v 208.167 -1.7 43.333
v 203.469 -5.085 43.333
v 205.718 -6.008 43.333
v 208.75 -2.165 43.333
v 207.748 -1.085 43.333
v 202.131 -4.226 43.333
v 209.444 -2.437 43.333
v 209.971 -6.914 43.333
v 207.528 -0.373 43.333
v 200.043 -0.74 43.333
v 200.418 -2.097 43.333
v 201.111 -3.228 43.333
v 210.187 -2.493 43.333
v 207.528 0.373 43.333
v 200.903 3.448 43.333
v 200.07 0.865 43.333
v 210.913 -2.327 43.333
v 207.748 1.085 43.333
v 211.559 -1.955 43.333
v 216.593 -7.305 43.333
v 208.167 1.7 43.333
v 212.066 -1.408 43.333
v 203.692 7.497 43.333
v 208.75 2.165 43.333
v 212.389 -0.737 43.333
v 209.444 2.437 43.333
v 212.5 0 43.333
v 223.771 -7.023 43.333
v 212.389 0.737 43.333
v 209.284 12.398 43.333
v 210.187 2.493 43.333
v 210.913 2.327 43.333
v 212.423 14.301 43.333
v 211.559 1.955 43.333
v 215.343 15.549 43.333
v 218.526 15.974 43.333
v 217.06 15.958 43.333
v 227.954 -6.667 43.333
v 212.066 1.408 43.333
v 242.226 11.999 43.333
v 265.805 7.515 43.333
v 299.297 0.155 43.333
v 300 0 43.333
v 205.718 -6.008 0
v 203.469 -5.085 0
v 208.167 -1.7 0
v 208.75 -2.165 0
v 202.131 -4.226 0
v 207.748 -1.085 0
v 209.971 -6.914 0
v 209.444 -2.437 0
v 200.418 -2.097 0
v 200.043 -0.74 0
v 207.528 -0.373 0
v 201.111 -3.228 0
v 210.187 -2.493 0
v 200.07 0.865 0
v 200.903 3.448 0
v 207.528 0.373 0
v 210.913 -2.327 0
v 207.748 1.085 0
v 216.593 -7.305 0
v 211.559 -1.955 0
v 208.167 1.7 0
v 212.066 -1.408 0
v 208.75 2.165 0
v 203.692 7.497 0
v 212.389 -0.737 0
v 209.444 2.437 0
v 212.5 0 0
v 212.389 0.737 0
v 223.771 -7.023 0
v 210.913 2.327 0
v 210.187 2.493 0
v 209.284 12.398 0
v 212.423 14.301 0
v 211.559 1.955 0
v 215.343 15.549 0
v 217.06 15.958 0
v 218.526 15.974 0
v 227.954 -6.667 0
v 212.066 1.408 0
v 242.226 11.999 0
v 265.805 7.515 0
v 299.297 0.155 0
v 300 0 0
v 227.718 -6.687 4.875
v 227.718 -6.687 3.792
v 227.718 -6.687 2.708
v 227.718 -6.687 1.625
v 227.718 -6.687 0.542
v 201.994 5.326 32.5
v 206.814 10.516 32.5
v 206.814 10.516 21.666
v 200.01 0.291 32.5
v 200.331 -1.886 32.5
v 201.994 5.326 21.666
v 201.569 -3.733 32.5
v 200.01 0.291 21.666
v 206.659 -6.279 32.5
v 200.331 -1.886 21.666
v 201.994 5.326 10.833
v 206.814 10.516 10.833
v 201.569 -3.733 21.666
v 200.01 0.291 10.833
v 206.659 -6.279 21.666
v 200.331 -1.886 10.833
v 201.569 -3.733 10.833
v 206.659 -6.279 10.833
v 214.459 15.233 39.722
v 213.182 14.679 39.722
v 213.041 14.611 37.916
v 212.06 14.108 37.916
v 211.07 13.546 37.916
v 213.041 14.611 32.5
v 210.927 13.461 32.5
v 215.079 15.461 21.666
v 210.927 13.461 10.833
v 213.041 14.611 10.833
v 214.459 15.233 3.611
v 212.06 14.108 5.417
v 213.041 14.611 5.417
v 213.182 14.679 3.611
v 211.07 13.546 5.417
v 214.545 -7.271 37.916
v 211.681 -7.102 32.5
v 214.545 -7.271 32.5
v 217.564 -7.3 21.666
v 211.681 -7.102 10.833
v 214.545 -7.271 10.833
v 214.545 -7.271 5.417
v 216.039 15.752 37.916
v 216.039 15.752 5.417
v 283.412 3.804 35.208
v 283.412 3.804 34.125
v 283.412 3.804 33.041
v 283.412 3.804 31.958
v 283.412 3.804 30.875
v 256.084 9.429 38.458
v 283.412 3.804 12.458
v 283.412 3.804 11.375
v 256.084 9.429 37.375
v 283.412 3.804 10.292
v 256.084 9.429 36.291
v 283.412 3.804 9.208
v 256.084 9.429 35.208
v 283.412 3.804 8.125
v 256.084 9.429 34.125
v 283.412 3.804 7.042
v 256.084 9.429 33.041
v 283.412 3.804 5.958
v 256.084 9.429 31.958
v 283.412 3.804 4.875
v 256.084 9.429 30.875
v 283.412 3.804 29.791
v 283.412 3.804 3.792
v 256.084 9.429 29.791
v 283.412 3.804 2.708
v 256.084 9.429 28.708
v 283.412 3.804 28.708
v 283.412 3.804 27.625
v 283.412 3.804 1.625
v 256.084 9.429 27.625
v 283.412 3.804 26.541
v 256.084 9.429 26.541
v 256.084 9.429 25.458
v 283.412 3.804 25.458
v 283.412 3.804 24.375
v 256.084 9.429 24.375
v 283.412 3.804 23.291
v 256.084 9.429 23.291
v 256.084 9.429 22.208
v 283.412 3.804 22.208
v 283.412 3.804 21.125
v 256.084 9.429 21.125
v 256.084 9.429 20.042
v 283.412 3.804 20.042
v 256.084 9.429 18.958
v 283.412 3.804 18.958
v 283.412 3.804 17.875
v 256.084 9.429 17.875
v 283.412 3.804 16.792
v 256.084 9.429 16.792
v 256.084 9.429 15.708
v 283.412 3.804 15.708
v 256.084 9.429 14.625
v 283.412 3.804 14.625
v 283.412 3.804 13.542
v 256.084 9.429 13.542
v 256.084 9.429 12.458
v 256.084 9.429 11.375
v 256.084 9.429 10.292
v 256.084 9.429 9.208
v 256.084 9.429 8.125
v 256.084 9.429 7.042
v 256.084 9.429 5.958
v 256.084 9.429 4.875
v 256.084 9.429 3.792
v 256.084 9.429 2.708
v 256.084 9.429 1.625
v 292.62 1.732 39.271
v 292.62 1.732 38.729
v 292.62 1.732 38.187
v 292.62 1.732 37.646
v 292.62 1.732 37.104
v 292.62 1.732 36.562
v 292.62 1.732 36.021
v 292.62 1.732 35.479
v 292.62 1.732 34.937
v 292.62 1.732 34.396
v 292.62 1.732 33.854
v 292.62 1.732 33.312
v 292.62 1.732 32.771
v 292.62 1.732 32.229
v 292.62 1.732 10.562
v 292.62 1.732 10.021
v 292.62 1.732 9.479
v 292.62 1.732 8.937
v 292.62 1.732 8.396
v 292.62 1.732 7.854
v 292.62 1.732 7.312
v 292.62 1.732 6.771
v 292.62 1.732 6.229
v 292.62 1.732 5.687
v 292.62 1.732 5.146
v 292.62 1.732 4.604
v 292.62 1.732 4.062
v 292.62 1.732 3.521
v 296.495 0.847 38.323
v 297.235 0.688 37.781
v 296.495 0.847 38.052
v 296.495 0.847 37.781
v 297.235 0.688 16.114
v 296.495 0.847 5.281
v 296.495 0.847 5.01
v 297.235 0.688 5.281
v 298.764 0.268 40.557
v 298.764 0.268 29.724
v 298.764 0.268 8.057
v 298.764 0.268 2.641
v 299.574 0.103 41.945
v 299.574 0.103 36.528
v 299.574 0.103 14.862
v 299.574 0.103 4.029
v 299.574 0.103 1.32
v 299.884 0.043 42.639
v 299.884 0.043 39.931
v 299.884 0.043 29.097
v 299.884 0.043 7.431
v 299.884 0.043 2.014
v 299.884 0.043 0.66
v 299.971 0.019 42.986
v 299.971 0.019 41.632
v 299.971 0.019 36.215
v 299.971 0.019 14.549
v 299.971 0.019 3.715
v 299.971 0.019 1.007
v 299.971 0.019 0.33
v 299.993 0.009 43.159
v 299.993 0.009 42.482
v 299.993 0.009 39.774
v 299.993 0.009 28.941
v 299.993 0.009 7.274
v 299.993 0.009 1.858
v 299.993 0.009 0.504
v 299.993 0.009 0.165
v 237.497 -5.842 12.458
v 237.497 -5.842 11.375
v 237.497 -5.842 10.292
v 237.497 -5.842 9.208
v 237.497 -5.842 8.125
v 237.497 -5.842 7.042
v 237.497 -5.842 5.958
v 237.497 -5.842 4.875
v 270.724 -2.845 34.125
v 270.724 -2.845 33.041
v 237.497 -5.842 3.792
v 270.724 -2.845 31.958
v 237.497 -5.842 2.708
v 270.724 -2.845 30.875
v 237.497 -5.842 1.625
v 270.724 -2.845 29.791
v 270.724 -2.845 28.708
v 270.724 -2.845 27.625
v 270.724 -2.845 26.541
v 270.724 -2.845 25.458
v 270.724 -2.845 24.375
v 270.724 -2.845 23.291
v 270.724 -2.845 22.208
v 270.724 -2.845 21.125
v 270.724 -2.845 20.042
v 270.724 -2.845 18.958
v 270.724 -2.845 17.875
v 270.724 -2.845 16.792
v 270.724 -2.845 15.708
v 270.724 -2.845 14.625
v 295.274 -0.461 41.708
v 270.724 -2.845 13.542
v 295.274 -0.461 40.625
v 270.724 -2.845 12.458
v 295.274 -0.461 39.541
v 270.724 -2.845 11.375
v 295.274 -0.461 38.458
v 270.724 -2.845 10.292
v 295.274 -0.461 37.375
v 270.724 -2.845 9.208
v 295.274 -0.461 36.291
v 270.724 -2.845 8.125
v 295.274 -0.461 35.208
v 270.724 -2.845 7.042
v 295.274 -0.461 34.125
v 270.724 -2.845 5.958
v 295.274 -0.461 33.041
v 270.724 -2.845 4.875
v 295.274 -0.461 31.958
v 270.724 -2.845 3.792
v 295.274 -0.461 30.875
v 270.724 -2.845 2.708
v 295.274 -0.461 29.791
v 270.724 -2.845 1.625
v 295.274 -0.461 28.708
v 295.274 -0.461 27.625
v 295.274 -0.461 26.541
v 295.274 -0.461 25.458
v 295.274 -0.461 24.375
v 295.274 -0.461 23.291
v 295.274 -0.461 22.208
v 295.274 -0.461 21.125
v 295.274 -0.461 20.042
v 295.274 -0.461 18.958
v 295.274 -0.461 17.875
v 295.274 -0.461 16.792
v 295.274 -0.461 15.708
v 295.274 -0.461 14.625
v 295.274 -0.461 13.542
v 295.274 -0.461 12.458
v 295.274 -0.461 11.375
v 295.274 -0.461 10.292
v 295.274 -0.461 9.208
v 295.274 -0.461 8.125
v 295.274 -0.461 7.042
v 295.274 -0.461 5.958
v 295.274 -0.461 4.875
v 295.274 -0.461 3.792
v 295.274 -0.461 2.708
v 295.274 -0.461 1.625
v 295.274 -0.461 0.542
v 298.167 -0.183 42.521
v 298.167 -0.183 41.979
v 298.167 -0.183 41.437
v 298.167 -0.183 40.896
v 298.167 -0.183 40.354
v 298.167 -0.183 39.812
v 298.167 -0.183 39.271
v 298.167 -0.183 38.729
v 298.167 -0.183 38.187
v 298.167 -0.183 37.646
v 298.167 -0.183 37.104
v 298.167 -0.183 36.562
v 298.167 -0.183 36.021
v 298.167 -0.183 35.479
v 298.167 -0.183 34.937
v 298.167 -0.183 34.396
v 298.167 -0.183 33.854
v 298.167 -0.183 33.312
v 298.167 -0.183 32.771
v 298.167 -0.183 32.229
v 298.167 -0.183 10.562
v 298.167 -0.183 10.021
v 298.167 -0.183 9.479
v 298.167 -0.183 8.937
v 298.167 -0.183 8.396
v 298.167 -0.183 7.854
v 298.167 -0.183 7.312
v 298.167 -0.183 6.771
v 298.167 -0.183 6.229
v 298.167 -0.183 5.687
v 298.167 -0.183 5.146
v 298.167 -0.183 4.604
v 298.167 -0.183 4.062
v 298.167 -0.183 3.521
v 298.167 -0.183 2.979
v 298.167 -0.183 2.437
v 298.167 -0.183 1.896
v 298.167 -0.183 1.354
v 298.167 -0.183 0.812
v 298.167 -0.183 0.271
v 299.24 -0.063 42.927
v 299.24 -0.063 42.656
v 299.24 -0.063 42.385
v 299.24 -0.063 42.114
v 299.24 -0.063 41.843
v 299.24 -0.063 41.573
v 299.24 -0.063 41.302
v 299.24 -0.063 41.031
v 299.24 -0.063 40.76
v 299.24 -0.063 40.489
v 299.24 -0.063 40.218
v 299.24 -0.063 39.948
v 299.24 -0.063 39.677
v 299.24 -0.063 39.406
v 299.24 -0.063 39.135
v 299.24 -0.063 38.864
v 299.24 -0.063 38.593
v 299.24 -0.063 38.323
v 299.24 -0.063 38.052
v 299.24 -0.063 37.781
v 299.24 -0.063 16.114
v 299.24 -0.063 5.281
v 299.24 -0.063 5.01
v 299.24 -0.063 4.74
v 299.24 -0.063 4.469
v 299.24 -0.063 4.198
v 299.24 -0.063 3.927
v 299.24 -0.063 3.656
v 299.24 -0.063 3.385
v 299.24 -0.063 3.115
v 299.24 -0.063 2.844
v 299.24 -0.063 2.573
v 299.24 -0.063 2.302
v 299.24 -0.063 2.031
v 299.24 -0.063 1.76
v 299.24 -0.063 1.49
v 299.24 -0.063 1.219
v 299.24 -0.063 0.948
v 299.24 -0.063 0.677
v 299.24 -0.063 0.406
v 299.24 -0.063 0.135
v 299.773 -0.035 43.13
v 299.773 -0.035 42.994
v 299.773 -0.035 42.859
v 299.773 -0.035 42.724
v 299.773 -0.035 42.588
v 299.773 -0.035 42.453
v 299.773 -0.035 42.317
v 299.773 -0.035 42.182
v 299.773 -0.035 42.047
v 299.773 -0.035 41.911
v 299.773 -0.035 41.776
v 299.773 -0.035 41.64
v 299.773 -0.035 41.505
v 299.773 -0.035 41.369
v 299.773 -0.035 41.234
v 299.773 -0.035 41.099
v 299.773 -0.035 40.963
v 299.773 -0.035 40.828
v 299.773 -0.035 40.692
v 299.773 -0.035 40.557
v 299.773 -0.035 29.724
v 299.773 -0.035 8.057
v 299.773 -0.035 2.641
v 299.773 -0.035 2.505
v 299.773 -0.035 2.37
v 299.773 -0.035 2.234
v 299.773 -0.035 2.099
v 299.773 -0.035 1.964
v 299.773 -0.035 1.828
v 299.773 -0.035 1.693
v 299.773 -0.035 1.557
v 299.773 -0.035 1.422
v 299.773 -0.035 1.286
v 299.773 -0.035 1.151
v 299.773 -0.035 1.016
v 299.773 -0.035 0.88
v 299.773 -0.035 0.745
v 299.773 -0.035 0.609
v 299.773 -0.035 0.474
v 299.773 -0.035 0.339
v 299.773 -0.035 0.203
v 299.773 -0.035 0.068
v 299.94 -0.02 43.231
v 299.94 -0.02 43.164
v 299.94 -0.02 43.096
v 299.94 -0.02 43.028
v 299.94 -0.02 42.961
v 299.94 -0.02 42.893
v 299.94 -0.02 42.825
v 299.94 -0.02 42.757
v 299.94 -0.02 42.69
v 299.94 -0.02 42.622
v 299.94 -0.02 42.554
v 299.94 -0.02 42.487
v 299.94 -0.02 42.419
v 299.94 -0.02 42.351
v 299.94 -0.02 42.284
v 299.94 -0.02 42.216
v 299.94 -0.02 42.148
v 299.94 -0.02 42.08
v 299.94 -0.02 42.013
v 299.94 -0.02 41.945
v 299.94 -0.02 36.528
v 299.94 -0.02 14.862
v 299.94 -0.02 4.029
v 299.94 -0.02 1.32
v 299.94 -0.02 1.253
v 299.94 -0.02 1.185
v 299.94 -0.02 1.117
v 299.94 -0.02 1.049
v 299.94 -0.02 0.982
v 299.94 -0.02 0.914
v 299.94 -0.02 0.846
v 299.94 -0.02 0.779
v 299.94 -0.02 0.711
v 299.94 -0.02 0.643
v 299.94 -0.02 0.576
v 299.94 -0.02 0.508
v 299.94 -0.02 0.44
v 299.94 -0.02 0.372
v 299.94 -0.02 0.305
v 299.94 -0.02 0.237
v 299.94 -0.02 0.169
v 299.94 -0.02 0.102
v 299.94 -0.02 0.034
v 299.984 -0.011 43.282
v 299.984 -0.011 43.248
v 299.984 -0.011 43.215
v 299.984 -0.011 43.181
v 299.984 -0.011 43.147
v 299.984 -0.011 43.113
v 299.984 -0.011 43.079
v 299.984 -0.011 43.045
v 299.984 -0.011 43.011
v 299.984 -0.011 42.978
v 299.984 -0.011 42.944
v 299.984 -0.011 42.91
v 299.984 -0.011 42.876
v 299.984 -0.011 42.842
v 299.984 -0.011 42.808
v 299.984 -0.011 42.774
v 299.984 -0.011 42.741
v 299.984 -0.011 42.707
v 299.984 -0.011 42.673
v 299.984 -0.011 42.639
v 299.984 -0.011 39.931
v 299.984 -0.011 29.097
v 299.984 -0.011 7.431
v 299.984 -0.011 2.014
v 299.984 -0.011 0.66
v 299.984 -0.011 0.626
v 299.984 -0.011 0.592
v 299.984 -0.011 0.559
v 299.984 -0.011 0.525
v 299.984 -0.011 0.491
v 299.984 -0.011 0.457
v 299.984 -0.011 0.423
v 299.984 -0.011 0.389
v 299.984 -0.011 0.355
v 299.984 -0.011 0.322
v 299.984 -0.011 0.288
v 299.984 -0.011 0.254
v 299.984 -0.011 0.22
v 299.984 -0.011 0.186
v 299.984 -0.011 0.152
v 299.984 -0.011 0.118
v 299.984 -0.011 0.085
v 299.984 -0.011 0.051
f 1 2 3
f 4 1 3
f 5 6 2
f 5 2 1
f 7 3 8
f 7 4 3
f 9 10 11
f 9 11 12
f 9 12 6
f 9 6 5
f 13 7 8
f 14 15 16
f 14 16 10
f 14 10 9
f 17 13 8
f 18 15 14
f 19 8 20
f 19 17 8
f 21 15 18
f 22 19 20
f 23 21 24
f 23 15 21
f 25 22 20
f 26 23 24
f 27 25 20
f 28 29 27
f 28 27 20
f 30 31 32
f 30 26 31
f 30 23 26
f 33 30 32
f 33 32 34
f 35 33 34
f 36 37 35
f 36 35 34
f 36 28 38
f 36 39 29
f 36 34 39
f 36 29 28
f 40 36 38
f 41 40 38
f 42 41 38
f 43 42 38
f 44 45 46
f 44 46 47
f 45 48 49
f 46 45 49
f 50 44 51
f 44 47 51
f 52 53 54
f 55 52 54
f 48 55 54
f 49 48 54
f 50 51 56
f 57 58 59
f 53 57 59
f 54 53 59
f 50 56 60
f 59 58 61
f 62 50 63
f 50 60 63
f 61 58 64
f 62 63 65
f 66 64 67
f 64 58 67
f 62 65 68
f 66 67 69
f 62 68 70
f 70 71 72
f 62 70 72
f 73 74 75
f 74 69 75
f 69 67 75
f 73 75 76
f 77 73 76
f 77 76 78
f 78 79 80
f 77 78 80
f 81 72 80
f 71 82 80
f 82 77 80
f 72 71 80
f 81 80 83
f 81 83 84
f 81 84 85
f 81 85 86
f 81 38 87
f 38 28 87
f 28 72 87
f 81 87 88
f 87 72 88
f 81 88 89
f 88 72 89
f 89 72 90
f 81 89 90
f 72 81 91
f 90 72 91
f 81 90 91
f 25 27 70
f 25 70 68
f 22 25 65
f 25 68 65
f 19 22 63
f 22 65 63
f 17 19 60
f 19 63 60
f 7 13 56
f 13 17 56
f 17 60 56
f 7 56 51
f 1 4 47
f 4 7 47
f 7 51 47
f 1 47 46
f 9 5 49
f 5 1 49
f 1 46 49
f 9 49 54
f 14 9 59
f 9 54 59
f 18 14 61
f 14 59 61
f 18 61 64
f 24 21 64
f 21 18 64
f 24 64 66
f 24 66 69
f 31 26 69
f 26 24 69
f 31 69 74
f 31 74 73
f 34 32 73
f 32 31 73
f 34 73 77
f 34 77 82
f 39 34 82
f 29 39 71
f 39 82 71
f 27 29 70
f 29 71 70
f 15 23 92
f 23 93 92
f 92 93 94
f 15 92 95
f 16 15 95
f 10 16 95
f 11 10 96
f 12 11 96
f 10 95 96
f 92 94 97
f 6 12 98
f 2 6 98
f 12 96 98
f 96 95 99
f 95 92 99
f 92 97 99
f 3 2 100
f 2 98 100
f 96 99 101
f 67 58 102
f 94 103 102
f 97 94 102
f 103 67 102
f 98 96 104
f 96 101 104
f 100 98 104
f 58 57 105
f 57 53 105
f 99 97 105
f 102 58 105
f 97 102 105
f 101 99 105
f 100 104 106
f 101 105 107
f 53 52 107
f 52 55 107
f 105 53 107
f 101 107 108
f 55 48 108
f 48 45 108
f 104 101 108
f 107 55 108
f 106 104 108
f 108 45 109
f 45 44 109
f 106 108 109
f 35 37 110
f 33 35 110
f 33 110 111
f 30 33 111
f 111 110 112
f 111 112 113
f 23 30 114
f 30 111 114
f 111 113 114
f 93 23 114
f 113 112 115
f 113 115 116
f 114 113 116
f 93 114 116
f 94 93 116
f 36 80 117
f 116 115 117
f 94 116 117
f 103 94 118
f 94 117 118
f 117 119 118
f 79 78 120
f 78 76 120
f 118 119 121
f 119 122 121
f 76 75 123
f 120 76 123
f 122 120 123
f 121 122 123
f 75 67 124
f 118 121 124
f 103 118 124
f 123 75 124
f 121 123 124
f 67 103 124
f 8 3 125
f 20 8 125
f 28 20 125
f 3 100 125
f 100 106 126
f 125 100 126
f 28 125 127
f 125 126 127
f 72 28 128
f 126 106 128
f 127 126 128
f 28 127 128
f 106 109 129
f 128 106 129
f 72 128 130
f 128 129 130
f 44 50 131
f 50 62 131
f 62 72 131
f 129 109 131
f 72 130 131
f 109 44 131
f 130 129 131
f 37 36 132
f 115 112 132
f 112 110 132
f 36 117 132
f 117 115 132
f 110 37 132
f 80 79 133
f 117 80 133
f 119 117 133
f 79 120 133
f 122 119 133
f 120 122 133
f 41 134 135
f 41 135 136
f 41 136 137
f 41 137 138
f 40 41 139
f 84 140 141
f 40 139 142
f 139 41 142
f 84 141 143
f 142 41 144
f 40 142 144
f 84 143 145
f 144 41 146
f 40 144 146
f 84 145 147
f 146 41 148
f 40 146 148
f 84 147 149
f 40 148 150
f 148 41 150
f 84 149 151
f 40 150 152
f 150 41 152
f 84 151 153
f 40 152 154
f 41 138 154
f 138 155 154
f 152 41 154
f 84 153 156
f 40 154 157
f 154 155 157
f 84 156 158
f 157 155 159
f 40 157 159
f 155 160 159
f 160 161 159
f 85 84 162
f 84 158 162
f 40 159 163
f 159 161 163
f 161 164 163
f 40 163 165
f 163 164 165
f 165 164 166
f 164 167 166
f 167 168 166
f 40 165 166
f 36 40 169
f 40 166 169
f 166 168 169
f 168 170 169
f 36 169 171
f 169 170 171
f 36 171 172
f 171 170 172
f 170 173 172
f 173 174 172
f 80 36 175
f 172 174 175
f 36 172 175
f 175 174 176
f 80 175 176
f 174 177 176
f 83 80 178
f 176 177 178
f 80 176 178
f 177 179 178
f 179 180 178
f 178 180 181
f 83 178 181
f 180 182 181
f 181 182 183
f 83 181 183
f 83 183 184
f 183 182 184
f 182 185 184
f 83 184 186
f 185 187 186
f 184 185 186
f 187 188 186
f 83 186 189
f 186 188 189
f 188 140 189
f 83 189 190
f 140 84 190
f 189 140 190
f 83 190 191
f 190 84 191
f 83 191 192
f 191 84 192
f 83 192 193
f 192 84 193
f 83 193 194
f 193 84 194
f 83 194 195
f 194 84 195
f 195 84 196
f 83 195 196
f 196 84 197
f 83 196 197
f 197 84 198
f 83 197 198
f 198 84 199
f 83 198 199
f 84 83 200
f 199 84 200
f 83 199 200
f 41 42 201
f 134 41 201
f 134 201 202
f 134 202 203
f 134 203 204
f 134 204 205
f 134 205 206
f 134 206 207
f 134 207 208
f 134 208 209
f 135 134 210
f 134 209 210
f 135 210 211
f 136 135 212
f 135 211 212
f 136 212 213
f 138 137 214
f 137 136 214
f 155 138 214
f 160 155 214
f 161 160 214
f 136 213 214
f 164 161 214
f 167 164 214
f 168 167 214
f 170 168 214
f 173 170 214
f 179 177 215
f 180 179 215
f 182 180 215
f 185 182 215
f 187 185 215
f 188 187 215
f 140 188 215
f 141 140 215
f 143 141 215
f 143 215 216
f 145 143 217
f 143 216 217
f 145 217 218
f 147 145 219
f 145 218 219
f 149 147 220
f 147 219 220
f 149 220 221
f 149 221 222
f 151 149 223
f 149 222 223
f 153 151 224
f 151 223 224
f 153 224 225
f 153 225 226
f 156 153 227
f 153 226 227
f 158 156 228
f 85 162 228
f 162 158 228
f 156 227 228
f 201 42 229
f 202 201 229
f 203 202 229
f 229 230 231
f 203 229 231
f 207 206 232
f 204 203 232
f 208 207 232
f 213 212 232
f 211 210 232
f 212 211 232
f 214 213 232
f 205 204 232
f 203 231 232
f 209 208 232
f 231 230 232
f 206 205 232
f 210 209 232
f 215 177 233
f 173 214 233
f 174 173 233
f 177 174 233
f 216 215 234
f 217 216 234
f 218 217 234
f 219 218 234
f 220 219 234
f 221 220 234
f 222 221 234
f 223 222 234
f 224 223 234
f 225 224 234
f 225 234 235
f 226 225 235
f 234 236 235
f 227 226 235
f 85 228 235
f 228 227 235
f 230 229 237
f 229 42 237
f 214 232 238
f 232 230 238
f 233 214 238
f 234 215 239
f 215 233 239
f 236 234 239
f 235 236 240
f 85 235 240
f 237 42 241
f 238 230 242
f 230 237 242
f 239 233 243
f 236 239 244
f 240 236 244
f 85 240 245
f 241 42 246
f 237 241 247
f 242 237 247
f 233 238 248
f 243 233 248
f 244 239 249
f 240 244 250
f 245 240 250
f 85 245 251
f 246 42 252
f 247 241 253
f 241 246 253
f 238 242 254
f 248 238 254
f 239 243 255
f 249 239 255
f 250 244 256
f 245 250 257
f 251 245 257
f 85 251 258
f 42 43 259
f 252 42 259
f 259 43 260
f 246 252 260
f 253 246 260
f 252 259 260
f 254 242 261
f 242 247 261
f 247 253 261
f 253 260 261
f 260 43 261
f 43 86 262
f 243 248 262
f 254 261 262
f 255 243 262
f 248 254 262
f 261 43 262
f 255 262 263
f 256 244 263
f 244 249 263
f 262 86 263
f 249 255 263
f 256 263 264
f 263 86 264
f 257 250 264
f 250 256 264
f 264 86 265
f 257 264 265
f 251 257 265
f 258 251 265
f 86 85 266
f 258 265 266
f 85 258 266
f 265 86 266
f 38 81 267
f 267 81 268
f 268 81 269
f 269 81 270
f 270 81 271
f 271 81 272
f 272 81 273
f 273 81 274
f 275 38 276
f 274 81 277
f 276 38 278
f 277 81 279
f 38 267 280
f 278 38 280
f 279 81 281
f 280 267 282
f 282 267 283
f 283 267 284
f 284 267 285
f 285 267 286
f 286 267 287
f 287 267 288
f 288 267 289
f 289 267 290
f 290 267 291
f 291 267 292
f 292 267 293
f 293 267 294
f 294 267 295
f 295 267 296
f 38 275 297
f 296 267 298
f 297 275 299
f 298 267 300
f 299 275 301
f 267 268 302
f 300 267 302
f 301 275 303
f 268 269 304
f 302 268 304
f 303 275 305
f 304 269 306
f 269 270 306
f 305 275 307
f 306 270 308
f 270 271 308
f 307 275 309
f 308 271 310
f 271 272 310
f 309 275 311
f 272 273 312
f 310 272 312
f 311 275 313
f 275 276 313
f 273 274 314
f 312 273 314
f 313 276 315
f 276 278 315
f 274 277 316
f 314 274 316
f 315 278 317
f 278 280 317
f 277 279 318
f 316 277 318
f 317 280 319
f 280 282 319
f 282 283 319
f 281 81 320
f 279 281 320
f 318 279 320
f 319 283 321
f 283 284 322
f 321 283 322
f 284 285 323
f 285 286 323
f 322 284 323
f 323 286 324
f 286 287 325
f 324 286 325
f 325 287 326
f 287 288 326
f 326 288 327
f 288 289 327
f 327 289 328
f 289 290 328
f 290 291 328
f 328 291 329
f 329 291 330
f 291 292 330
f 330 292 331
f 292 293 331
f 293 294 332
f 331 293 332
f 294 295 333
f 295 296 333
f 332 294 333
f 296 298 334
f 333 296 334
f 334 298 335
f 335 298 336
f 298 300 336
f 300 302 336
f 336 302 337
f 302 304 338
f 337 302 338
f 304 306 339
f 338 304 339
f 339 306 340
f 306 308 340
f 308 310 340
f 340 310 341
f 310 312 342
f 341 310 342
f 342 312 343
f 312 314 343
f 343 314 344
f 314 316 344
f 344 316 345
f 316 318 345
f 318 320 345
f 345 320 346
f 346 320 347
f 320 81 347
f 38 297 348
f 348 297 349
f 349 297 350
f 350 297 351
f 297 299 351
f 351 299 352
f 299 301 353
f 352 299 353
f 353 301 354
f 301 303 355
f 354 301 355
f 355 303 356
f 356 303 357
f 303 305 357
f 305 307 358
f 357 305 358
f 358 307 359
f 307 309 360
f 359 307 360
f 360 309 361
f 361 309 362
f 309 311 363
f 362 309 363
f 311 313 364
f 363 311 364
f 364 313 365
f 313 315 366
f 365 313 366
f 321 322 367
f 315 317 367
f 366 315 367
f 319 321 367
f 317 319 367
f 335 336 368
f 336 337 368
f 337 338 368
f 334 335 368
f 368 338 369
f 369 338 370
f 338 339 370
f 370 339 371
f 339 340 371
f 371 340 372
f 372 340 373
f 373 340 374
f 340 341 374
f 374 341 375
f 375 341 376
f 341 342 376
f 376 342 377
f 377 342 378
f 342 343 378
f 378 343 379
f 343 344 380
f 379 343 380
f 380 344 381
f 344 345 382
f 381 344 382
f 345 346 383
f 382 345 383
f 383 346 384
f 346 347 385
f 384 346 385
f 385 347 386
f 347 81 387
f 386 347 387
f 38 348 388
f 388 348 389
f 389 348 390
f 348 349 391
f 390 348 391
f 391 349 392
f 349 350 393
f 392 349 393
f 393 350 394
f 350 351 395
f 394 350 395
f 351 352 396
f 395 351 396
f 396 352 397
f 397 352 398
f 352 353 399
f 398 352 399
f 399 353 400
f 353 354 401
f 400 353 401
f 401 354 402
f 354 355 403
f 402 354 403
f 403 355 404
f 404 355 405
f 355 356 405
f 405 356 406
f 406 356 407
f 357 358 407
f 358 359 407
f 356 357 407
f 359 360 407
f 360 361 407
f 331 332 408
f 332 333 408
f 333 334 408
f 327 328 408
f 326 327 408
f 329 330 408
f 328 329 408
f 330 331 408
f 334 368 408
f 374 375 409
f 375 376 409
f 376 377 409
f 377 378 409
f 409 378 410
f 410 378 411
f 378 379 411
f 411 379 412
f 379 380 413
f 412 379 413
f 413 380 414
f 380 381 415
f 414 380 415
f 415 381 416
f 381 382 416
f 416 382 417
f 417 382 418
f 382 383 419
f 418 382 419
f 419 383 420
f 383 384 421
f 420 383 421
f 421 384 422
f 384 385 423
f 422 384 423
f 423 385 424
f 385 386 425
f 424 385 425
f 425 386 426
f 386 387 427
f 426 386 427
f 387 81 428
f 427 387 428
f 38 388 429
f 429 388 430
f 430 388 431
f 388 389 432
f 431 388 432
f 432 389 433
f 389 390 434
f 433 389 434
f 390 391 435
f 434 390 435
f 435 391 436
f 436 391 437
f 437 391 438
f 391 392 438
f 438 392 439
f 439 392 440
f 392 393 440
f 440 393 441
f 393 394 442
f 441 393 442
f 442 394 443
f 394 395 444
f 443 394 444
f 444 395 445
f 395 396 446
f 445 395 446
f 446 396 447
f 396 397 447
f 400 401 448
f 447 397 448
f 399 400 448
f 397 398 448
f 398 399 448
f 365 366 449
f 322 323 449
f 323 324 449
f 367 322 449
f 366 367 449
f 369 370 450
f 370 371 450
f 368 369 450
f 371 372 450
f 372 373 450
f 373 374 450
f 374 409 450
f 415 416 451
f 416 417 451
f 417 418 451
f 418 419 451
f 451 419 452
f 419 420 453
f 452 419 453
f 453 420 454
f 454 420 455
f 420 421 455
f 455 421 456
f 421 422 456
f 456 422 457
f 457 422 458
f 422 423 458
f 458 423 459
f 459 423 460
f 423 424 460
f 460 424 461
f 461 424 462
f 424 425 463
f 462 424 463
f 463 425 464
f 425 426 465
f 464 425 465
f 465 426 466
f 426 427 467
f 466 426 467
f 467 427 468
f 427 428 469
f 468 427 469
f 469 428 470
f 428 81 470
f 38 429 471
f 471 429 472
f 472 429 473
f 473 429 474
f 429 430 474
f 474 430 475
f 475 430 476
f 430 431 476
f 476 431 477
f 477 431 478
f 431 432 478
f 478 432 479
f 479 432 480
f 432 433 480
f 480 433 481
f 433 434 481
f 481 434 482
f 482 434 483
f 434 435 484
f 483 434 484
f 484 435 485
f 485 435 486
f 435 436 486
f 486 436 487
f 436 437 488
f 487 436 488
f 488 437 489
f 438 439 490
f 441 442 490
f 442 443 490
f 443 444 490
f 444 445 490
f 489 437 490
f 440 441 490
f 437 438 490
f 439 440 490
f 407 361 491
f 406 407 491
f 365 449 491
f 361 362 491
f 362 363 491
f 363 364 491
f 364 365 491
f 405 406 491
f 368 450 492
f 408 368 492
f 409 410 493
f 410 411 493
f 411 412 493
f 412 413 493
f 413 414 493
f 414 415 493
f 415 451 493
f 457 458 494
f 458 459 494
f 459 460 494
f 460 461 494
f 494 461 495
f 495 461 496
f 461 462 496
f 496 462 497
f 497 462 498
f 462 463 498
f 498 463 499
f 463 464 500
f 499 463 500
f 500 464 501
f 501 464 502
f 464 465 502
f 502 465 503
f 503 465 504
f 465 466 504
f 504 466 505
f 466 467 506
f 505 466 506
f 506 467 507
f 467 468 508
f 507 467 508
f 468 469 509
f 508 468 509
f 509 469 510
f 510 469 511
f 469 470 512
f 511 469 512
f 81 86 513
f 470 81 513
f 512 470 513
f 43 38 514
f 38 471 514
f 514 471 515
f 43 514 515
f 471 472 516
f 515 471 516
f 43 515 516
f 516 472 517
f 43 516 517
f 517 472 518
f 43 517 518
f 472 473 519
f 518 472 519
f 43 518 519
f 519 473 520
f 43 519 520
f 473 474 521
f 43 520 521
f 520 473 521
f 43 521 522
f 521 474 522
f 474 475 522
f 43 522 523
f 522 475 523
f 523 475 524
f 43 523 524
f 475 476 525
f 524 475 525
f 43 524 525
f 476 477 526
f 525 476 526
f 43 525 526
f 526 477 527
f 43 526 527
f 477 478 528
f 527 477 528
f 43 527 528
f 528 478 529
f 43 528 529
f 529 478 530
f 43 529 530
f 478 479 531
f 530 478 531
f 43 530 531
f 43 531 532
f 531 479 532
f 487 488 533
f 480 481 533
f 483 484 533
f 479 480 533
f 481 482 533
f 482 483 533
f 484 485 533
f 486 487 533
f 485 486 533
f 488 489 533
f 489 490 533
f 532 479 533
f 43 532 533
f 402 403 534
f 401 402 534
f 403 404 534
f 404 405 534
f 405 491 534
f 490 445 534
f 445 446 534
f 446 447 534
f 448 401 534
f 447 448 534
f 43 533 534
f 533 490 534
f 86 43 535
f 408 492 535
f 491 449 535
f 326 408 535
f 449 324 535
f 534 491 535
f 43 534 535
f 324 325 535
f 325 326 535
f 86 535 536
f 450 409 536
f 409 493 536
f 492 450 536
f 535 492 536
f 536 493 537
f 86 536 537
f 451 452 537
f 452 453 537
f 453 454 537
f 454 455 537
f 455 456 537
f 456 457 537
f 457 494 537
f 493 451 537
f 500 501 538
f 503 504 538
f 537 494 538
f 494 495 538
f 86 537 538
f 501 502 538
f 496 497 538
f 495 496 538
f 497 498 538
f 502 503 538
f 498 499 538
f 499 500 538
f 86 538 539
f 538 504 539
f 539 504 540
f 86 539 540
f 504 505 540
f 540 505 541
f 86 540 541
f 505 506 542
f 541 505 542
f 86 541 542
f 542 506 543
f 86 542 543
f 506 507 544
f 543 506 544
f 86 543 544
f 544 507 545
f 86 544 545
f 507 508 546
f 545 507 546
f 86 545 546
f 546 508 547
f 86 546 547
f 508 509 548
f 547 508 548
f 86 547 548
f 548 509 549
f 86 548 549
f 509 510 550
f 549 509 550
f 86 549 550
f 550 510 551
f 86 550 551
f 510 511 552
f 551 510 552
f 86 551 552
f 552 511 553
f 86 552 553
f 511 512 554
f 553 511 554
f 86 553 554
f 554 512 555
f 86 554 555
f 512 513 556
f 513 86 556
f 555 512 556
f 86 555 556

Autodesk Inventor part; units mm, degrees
ref_plane "YZ Plane" through (0, 0, 0) normal (1, 0, 0) x (0, 1, 0)
ref_plane "XZ Plane" through (0, 0, 0) normal (0, 1, 0) x (-1, 0, 0)
ref_plane "XY Plane" through (0, 0, 0) normal (0, 0, 1) x (1, 0, 0)
sketch "Sketch1" plane through (0, 0, 0) normal (0, 0, 1) x (1, 0, 0)
  spline S0 degree 5 poles (300, 0) (300.0016, 0.0244) (299.7036, 0.09) (298.2843, 0.2856) (298.1861, 0.6201) (294.2411, 1.1852) (292.5088, 1.8941) (287.5168, 2.8048) (283.3251, 3.8823) (277.2635, 5.114) (271.0288, 6.4738) (263.7046, 7.9415) (255.8588, 9.4927) (247.2609, 11.1039) (238.105, 12.7506) (228.3746, 14.4096) (218.1643, 16.0564) (207.5185, 17.6669) (196.5111, 19.219) (185.2054, 20.6879) (173.6732, 22.052) (161.9834, 23.2887) (150.21, 24.3752) (138.4162, 25.2964) (126.6928, 26.0196) (115.0744, 26.5602) (103.5988, 26.7997) (92.4288, 26.7578) (81.6023, 26.4231) (71.2108, 25.8005) (61.3178, 24.8978) (51.9933, 23.7307) (43.2967, 22.3175) (35.2844, 20.6817) (28.0043, 18.8519) (21.5007, 16.8582) (15.8056, 14.7303) (10.9426, 12.4987) (6.9231, 10.1816) (3.745, 7.791) (1.4298, 5.3026) (0.027, 2.7048) (-0.2762, -0.026) (0.5609, -2.6395) (2.4314, -4.909) (5.1526, -6.9052) (8.674, -8.6574) (12.9744, -10.2099) (18.0511, -11.5643) (23.8856, -12.7277) (30.4535, -13.6933) (37.7169, -14.4652) (45.6371, -15.0404) (54.1678, -15.428) (63.2602, -15.6353) (72.8628, -15.6753) (82.9246, -15.5641) (93.3855, -15.3196) (104.2036, -14.9665) (115.2834, -14.5145) (126.6481, -14.0171) (138.1928, -13.3887) (149.8108, -12.6841) (161.4481, -11.9059) (173.0242, -11.0809) (184.4692, -10.2189) (195.7125, -9.3406) (206.6821, -8.4534) (217.315, -7.5734) (227.5362, -6.706) (237.2988, -5.8637) (246.5067, -5.0508) (255.1715, -4.2808) (263.0989, -3.5455) (270.5088, -2.8843) (276.8391, -2.2398) (282.9867, -1.7375) (287.2724, -1.1764) (292.3303, -0.9034) (294.139, -0.4203) (298.1203, -0.3746) (298.262, -0.0558) (299.6943, -0.05) (299.9984, -0.0244) (300, 0) knots 0 0 0 0 0 0 0.005555 0.010406 0.017155 0.025351 0.034694 0.045016 0.056192 0.068127 0.080735 0.093944 0.107687 0.121902 0.13653 0.151515 0.166802 0.182339 0.198074 0.213956 0.229934 0.245959 0.261986 0.277975 0.293876 0.30964 0.325217 0.340551 0.355583 0.370262 0.384536 0.398352 0.411658 0.424397 0.436516 0.447959 0.458676 0.468629 0.477816 0.486311 0.494269 0.501928 0.509582 0.517526 0.525994 0.535136 0.54502 0.555644 0.566968 0.578942 0.591513 0.604627 0.618231 0.632275 0.64671 0.661487 0.676558 0.691886 0.707429 0.72314 0.738971 0.754875 0.770794 0.786673 0.802462 0.818112 0.833572 0.848791 0.863714 0.878289 0.892459 0.906165 0.919343 0.931928 0.943844 0.955007 0.965319 0.974656 0.982848 0.989595 0.994445 1 1 1 1 1 1
  line L0 (200, 103) -> (200, -97) construction
  line L1 (0, -164.4758) -> (0, 307.8549) construction
  line L2 (210, 0) -> (210, -12) construction
  line L3 (210, 0) -> (222, 0) construction
  spline S1 degree 4 poles (218.5257, 15.9738) (209.601, 17.344) (179.4452, -9.5392) (209.7943, -8.4144) (227.9538, -6.6666) knots 0 0 0 0 0 1 1 1 1 1
  line L4 (221.1774, 15.5667) -> (215.874, 16.3809) construction
  arc A0 (220.2542, 15.1852) -> (216.6402, 15.74) centre (217.9961, 12.5243) ccw construction
  line L5 (222.2571, -7.2149) -> (233.6505, -6.1183) construction
  arc A1 (223.3931, -7.0631) -> (232.5064, -6.186) centre (204.1762, 240.3791) ccw construction
  circle A2 centre (210, 0) radius 2.5
  point P0 (0, 0)
  point P1 (298.1739, 0.4338)
  point P2 (295.9008, 0.9681)
  point P3 (292.7367, 1.7025)
  point P4 (288.6996, 2.6229)
  point P5 (283.8129, 3.7134)
  point P6 (278.1048, 4.9545)
  point P7 (271.6086, 6.3255)
  point P8 (264.3621, 7.8039)
  point P9 (256.4085, 9.3663)
  point P10 (247.7946, 10.9887)
  point P11 (238.572, 12.6468)
  point P12 (228.7959, 14.3166)
  point P13 (207.8235, 17.5944)
  point P14 (196.755, 19.155)
  point P15 (185.388, 20.6319)
  point P16 (173.7924, 22.0023)
  point P17 (162.0405, 23.2434)
  point P18 (150.2055, 24.3336)
  point P19 (138.3615, 25.2522)
  point P20 (126.5832, 25.98)
  point P21 (114.8976, 26.493)
  point P22 (103.3635, 26.7315)
  point P23 (92.1183, 26.6775)
  point P24 (81.2367, 26.3292)
  point P25 (70.7922, 25.689)
  point P26 (60.8541, 24.7656)
  point P27 (51.489, 23.5734)
  point P28 (42.7587, 22.131)
  point P29 (34.7199, 20.4618)
  point P30 (27.4239, 18.5934)
  point P31 (20.9172, 16.5555)
  point P32 (15.2385, 14.379)
  point P33 (10.422, 12.0954)
  point P34 (6.4944, 9.7347)
  point P35 (3.4767, 7.3239)
  point P36 (1.3836, 4.8867)
  point P37 (0.2238, 2.4411)
  point P38 (0, 0)
  point P39 (0.7011, -2.3487)
  point P40 (2.31, -4.5201)
  point P41 (4.8123, -6.5094)
  point P42 (8.1885, -8.3112)
  point P43 (12.414, -9.9204)
  point P44 (17.4594, -11.3319)
  point P45 (23.2908, -12.5418)
  point P46 (29.871, -13.5477)
  point P47 (37.1583, -14.3505)
  point P48 (45.1092, -14.9526)
  point P49 (53.6766, -15.3609)
  point P50 (62.8101, -15.5853)
  point P51 (72.4581, -15.639)
  point P52 (82.566, -15.5385)
  point P53 (93.0768, -15.3033)
  point P54 (103.9314, -14.9544)
  point P55 (115.0689, -14.514)
  point P56 (126.4866, -13.9956)
  point P57 (138.1008, -13.3755)
  point P58 (149.7945, -12.6672)
  point P59 (161.4972, -11.8896)
  point P60 (173.1378, -11.061)
  point P61 (184.6455, -10.1973)
  point P62 (195.9501, -9.3141)
  point P63 (206.9814, -8.4237)
  point P64 (217.6716, -7.5381)
  point P65 (227.9538, -6.6666)
  point P66 (237.7638, -5.8185)
  point P67 (247.0398, -5.0019)
  point P68 (255.7236, -4.2234)
  point P69 (263.7597, -3.4905)
  point P70 (271.0965, -2.8098)
  point P71 (277.6872, -2.1882)
  point P72 (283.4889, -1.6323)
  point P73 (288.4641, -1.1487)
  point P74 (292.5804, -0.7434)
  point P75 (295.8102, -0.4221)
  point P76 (298.1328, -0.1887)
  point P77 (299.5323, -0.0474)
  point P78 (200, 0)
  point P79 (223.7705, -7.0234)
  dimension "d0" = 200
  dimension "d2" = 200
  dimension "d3" = 12
  dimension "d4" = 90
  dimension "d5" = 10
  dimension "d17" = 5
extrude "Extrusion2" add sketch "Sketch1" along normal blind 43.333 contours S0 S1 picked at (264.3061, 0.3433)
properties part number "4P.01.01.01-TW-v1-Flap Shape Definition"
